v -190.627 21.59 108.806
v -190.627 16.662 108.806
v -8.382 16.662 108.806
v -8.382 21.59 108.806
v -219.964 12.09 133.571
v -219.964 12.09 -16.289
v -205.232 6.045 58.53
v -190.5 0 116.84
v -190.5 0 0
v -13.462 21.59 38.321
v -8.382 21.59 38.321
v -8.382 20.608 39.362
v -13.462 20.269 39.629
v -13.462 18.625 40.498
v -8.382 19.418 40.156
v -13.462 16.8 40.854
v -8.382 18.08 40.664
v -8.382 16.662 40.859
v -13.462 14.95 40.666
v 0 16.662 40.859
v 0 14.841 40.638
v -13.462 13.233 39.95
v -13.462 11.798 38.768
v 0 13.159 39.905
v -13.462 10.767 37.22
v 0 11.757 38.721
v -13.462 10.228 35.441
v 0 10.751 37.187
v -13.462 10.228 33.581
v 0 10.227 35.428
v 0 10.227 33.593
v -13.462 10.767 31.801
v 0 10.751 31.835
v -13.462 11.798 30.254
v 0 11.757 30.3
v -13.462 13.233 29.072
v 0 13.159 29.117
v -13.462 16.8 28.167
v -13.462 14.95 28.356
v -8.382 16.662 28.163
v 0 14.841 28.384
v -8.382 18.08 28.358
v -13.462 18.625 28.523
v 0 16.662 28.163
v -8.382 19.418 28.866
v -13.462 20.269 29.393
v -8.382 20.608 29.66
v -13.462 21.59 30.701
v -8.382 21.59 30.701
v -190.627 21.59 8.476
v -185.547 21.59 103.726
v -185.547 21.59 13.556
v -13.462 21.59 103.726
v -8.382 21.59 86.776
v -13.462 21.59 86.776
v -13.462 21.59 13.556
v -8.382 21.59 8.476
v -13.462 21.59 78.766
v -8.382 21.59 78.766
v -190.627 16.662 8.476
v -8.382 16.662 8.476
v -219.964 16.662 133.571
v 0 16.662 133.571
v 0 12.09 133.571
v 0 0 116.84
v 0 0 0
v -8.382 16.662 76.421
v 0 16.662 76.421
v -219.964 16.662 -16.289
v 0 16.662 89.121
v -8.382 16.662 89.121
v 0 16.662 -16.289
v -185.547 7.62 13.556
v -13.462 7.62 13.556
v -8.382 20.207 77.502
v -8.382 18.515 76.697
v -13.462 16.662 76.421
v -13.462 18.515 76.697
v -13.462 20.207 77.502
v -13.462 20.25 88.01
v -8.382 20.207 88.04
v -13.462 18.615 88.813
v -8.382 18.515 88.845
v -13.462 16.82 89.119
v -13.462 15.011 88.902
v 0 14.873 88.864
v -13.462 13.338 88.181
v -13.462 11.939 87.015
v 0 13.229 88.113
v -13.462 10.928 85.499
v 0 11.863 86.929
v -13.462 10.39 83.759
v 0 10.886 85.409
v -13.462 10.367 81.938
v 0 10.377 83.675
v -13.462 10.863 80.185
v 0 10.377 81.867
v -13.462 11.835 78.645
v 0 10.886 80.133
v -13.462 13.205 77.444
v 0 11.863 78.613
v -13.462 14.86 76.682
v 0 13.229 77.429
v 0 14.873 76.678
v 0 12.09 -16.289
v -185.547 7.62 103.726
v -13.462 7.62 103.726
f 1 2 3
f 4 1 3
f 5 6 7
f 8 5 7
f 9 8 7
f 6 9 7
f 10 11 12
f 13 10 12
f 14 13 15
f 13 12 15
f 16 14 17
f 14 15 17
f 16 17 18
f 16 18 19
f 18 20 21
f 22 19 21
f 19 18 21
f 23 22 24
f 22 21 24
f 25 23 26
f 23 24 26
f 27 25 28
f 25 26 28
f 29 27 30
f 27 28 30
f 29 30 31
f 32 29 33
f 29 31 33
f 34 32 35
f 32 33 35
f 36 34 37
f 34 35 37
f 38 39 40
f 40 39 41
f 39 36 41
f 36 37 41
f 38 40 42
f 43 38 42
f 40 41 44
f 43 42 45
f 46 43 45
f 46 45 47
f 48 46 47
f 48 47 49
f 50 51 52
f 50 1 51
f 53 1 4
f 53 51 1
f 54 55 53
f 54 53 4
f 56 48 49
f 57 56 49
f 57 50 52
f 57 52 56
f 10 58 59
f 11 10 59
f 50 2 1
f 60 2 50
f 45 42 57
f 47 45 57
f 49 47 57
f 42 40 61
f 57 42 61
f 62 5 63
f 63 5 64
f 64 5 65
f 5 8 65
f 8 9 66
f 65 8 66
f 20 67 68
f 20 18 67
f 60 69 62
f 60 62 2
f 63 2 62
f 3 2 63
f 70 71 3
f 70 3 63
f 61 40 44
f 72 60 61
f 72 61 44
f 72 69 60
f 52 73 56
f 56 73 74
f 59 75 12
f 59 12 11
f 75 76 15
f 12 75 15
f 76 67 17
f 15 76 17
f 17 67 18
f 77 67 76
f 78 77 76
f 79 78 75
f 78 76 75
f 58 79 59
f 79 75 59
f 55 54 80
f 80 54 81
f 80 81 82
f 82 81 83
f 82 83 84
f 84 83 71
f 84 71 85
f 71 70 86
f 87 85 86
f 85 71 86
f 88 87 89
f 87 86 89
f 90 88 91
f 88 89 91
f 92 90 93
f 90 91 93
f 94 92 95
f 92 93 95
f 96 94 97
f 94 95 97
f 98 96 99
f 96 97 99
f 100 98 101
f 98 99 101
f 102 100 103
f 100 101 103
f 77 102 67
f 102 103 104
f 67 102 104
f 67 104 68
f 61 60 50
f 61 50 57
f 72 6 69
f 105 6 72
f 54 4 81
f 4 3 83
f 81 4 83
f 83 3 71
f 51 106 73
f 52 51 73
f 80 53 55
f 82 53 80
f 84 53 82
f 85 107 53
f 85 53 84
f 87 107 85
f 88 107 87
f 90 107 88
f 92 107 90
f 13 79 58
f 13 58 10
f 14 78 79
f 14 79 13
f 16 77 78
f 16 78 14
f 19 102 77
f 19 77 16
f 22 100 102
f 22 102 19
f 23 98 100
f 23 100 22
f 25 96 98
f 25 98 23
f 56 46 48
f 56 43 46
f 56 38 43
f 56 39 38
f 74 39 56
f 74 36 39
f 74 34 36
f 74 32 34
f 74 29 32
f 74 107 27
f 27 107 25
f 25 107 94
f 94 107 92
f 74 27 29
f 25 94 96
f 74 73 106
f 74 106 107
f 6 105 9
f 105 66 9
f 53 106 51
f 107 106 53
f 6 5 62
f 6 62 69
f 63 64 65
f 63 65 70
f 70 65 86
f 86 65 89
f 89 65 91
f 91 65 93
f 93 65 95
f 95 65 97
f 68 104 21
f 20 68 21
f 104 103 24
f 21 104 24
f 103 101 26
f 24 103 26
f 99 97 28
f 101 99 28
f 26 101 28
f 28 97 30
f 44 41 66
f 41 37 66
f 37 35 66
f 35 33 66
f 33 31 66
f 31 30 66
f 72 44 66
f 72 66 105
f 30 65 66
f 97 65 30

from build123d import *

# Parameters (mm, degrees)
SKETCH2_2_W         = 219.964
SKETCH2_2_H         = 149.86
BOSS_EXTRUDE2_DEPTH = 4.572
SKETCH3_W           = 182.245
SKETCH3_H           = 100.33
BOSS_EXTRUDE3_DEPTH = 5.08
SKETCH4_W           = 172.085
SKETCH4_H           = 90.17
CUT_EXTRUDE1_DEPTH  = 258.8719036
SKETCH4_2_W         = 172.085
SKETCH4_2_H         = 90.17
CUT_EXTRUDE2_DEPTH  = 8.89
SKETCH5_R           = 6.35
CUT_EXTRUDE3_DEPTH  = 19.05


with BuildPart() as part:
    # Sketch2 → Loft1 section 0
    with BuildSketch(Plane(origin=(0, 12.0904, 0), x_dir=(1, 0, 0), z_dir=(0, 1, 0))):
        with BuildLine():
            Line((-219.964, 16.289130435), (0, 16.289130435))
            Line((0, 16.289130435), (0, -133.570869565))
            Line((0, -133.570869565), (-219.964, -133.570869565))
            Line((-219.964, -133.570869565), (-219.964, 16.289130435))
        make_face()
    # Sketch1 → Loft1 section 1
    with BuildSketch(Plane(origin=(0, 0, 0), x_dir=(1, 0, 0), z_dir=(0, 1, 0))):
        with BuildLine():
            Line((-190.5, 0), (0, 0))
            Line((0, 0), (0, -116.84))
            Line((0, -116.84), (-190.5, -116.84))
            Line((-190.5, -116.84), (-190.5, 0))
        make_face()
    loft()

    # Sketch2<2> → Boss-Extrude2 (add)
    with BuildSketch(Plane(origin=(0, 12.0904, 0), x_dir=(1, 0, 0), z_dir=(0, 1, 0))):
        with Locations((-109.982, -58.640869565)):
            Rectangle(SKETCH2_2_W, SKETCH2_2_H)
    extrude(amount=BOSS_EXTRUDE2_DEPTH)

    # Sketch3 → Boss-Extrude3 (add)
    with BuildSketch(Plane(origin=(0, 16.51, 0), x_dir=(1, 0, 0), z_dir=(0, 1, 0))):
        with Locations((-99.5045, -58.640869565)):
            Rectangle(SKETCH3_W, SKETCH3_H)
    extrude(amount=BOSS_EXTRUDE3_DEPTH)

    # Sketch4 → Cut-Extrude1 (cut, through all)
    with BuildSketch(Plane(origin=(0, 16.51, 0), x_dir=(1, 0, 0), z_dir=(0, 1, 0))):
        with Locations((-99.5045, -58.640869565)):
            Rectangle(SKETCH4_W, SKETCH4_H)
    extrude(amount=CUT_EXTRUDE1_DEPTH, mode=Mode.SUBTRACT)

    # Sketch4<2> → Cut-Extrude2 (cut)
    with BuildSketch(Plane(origin=(0, 16.51, 0), x_dir=(1, 0, 0), z_dir=(0, 1, 0))):
        with Locations((-99.5045, -58.640869565)):
            Rectangle(SKETCH4_2_W, SKETCH4_2_H)
    extrude(amount=-CUT_EXTRUDE2_DEPTH, mode=Mode.SUBTRACT)

    # Sketch5 → Cut-Extrude3 (cut)
    with BuildSketch(Plane(origin=(0, 0, 0), x_dir=(0, 0, -1), z_dir=(1, 0, 0))):
        with Locations((-82.770869565, 16.6624)):
            Circle(SKETCH5_R)
        with Locations((-34.510869565, 16.51)):
            Circle(SKETCH5_R)
    extrude(amount=-CUT_EXTRUDE3_DEPTH, mode=Mode.SUBTRACT)


solid = part.part
